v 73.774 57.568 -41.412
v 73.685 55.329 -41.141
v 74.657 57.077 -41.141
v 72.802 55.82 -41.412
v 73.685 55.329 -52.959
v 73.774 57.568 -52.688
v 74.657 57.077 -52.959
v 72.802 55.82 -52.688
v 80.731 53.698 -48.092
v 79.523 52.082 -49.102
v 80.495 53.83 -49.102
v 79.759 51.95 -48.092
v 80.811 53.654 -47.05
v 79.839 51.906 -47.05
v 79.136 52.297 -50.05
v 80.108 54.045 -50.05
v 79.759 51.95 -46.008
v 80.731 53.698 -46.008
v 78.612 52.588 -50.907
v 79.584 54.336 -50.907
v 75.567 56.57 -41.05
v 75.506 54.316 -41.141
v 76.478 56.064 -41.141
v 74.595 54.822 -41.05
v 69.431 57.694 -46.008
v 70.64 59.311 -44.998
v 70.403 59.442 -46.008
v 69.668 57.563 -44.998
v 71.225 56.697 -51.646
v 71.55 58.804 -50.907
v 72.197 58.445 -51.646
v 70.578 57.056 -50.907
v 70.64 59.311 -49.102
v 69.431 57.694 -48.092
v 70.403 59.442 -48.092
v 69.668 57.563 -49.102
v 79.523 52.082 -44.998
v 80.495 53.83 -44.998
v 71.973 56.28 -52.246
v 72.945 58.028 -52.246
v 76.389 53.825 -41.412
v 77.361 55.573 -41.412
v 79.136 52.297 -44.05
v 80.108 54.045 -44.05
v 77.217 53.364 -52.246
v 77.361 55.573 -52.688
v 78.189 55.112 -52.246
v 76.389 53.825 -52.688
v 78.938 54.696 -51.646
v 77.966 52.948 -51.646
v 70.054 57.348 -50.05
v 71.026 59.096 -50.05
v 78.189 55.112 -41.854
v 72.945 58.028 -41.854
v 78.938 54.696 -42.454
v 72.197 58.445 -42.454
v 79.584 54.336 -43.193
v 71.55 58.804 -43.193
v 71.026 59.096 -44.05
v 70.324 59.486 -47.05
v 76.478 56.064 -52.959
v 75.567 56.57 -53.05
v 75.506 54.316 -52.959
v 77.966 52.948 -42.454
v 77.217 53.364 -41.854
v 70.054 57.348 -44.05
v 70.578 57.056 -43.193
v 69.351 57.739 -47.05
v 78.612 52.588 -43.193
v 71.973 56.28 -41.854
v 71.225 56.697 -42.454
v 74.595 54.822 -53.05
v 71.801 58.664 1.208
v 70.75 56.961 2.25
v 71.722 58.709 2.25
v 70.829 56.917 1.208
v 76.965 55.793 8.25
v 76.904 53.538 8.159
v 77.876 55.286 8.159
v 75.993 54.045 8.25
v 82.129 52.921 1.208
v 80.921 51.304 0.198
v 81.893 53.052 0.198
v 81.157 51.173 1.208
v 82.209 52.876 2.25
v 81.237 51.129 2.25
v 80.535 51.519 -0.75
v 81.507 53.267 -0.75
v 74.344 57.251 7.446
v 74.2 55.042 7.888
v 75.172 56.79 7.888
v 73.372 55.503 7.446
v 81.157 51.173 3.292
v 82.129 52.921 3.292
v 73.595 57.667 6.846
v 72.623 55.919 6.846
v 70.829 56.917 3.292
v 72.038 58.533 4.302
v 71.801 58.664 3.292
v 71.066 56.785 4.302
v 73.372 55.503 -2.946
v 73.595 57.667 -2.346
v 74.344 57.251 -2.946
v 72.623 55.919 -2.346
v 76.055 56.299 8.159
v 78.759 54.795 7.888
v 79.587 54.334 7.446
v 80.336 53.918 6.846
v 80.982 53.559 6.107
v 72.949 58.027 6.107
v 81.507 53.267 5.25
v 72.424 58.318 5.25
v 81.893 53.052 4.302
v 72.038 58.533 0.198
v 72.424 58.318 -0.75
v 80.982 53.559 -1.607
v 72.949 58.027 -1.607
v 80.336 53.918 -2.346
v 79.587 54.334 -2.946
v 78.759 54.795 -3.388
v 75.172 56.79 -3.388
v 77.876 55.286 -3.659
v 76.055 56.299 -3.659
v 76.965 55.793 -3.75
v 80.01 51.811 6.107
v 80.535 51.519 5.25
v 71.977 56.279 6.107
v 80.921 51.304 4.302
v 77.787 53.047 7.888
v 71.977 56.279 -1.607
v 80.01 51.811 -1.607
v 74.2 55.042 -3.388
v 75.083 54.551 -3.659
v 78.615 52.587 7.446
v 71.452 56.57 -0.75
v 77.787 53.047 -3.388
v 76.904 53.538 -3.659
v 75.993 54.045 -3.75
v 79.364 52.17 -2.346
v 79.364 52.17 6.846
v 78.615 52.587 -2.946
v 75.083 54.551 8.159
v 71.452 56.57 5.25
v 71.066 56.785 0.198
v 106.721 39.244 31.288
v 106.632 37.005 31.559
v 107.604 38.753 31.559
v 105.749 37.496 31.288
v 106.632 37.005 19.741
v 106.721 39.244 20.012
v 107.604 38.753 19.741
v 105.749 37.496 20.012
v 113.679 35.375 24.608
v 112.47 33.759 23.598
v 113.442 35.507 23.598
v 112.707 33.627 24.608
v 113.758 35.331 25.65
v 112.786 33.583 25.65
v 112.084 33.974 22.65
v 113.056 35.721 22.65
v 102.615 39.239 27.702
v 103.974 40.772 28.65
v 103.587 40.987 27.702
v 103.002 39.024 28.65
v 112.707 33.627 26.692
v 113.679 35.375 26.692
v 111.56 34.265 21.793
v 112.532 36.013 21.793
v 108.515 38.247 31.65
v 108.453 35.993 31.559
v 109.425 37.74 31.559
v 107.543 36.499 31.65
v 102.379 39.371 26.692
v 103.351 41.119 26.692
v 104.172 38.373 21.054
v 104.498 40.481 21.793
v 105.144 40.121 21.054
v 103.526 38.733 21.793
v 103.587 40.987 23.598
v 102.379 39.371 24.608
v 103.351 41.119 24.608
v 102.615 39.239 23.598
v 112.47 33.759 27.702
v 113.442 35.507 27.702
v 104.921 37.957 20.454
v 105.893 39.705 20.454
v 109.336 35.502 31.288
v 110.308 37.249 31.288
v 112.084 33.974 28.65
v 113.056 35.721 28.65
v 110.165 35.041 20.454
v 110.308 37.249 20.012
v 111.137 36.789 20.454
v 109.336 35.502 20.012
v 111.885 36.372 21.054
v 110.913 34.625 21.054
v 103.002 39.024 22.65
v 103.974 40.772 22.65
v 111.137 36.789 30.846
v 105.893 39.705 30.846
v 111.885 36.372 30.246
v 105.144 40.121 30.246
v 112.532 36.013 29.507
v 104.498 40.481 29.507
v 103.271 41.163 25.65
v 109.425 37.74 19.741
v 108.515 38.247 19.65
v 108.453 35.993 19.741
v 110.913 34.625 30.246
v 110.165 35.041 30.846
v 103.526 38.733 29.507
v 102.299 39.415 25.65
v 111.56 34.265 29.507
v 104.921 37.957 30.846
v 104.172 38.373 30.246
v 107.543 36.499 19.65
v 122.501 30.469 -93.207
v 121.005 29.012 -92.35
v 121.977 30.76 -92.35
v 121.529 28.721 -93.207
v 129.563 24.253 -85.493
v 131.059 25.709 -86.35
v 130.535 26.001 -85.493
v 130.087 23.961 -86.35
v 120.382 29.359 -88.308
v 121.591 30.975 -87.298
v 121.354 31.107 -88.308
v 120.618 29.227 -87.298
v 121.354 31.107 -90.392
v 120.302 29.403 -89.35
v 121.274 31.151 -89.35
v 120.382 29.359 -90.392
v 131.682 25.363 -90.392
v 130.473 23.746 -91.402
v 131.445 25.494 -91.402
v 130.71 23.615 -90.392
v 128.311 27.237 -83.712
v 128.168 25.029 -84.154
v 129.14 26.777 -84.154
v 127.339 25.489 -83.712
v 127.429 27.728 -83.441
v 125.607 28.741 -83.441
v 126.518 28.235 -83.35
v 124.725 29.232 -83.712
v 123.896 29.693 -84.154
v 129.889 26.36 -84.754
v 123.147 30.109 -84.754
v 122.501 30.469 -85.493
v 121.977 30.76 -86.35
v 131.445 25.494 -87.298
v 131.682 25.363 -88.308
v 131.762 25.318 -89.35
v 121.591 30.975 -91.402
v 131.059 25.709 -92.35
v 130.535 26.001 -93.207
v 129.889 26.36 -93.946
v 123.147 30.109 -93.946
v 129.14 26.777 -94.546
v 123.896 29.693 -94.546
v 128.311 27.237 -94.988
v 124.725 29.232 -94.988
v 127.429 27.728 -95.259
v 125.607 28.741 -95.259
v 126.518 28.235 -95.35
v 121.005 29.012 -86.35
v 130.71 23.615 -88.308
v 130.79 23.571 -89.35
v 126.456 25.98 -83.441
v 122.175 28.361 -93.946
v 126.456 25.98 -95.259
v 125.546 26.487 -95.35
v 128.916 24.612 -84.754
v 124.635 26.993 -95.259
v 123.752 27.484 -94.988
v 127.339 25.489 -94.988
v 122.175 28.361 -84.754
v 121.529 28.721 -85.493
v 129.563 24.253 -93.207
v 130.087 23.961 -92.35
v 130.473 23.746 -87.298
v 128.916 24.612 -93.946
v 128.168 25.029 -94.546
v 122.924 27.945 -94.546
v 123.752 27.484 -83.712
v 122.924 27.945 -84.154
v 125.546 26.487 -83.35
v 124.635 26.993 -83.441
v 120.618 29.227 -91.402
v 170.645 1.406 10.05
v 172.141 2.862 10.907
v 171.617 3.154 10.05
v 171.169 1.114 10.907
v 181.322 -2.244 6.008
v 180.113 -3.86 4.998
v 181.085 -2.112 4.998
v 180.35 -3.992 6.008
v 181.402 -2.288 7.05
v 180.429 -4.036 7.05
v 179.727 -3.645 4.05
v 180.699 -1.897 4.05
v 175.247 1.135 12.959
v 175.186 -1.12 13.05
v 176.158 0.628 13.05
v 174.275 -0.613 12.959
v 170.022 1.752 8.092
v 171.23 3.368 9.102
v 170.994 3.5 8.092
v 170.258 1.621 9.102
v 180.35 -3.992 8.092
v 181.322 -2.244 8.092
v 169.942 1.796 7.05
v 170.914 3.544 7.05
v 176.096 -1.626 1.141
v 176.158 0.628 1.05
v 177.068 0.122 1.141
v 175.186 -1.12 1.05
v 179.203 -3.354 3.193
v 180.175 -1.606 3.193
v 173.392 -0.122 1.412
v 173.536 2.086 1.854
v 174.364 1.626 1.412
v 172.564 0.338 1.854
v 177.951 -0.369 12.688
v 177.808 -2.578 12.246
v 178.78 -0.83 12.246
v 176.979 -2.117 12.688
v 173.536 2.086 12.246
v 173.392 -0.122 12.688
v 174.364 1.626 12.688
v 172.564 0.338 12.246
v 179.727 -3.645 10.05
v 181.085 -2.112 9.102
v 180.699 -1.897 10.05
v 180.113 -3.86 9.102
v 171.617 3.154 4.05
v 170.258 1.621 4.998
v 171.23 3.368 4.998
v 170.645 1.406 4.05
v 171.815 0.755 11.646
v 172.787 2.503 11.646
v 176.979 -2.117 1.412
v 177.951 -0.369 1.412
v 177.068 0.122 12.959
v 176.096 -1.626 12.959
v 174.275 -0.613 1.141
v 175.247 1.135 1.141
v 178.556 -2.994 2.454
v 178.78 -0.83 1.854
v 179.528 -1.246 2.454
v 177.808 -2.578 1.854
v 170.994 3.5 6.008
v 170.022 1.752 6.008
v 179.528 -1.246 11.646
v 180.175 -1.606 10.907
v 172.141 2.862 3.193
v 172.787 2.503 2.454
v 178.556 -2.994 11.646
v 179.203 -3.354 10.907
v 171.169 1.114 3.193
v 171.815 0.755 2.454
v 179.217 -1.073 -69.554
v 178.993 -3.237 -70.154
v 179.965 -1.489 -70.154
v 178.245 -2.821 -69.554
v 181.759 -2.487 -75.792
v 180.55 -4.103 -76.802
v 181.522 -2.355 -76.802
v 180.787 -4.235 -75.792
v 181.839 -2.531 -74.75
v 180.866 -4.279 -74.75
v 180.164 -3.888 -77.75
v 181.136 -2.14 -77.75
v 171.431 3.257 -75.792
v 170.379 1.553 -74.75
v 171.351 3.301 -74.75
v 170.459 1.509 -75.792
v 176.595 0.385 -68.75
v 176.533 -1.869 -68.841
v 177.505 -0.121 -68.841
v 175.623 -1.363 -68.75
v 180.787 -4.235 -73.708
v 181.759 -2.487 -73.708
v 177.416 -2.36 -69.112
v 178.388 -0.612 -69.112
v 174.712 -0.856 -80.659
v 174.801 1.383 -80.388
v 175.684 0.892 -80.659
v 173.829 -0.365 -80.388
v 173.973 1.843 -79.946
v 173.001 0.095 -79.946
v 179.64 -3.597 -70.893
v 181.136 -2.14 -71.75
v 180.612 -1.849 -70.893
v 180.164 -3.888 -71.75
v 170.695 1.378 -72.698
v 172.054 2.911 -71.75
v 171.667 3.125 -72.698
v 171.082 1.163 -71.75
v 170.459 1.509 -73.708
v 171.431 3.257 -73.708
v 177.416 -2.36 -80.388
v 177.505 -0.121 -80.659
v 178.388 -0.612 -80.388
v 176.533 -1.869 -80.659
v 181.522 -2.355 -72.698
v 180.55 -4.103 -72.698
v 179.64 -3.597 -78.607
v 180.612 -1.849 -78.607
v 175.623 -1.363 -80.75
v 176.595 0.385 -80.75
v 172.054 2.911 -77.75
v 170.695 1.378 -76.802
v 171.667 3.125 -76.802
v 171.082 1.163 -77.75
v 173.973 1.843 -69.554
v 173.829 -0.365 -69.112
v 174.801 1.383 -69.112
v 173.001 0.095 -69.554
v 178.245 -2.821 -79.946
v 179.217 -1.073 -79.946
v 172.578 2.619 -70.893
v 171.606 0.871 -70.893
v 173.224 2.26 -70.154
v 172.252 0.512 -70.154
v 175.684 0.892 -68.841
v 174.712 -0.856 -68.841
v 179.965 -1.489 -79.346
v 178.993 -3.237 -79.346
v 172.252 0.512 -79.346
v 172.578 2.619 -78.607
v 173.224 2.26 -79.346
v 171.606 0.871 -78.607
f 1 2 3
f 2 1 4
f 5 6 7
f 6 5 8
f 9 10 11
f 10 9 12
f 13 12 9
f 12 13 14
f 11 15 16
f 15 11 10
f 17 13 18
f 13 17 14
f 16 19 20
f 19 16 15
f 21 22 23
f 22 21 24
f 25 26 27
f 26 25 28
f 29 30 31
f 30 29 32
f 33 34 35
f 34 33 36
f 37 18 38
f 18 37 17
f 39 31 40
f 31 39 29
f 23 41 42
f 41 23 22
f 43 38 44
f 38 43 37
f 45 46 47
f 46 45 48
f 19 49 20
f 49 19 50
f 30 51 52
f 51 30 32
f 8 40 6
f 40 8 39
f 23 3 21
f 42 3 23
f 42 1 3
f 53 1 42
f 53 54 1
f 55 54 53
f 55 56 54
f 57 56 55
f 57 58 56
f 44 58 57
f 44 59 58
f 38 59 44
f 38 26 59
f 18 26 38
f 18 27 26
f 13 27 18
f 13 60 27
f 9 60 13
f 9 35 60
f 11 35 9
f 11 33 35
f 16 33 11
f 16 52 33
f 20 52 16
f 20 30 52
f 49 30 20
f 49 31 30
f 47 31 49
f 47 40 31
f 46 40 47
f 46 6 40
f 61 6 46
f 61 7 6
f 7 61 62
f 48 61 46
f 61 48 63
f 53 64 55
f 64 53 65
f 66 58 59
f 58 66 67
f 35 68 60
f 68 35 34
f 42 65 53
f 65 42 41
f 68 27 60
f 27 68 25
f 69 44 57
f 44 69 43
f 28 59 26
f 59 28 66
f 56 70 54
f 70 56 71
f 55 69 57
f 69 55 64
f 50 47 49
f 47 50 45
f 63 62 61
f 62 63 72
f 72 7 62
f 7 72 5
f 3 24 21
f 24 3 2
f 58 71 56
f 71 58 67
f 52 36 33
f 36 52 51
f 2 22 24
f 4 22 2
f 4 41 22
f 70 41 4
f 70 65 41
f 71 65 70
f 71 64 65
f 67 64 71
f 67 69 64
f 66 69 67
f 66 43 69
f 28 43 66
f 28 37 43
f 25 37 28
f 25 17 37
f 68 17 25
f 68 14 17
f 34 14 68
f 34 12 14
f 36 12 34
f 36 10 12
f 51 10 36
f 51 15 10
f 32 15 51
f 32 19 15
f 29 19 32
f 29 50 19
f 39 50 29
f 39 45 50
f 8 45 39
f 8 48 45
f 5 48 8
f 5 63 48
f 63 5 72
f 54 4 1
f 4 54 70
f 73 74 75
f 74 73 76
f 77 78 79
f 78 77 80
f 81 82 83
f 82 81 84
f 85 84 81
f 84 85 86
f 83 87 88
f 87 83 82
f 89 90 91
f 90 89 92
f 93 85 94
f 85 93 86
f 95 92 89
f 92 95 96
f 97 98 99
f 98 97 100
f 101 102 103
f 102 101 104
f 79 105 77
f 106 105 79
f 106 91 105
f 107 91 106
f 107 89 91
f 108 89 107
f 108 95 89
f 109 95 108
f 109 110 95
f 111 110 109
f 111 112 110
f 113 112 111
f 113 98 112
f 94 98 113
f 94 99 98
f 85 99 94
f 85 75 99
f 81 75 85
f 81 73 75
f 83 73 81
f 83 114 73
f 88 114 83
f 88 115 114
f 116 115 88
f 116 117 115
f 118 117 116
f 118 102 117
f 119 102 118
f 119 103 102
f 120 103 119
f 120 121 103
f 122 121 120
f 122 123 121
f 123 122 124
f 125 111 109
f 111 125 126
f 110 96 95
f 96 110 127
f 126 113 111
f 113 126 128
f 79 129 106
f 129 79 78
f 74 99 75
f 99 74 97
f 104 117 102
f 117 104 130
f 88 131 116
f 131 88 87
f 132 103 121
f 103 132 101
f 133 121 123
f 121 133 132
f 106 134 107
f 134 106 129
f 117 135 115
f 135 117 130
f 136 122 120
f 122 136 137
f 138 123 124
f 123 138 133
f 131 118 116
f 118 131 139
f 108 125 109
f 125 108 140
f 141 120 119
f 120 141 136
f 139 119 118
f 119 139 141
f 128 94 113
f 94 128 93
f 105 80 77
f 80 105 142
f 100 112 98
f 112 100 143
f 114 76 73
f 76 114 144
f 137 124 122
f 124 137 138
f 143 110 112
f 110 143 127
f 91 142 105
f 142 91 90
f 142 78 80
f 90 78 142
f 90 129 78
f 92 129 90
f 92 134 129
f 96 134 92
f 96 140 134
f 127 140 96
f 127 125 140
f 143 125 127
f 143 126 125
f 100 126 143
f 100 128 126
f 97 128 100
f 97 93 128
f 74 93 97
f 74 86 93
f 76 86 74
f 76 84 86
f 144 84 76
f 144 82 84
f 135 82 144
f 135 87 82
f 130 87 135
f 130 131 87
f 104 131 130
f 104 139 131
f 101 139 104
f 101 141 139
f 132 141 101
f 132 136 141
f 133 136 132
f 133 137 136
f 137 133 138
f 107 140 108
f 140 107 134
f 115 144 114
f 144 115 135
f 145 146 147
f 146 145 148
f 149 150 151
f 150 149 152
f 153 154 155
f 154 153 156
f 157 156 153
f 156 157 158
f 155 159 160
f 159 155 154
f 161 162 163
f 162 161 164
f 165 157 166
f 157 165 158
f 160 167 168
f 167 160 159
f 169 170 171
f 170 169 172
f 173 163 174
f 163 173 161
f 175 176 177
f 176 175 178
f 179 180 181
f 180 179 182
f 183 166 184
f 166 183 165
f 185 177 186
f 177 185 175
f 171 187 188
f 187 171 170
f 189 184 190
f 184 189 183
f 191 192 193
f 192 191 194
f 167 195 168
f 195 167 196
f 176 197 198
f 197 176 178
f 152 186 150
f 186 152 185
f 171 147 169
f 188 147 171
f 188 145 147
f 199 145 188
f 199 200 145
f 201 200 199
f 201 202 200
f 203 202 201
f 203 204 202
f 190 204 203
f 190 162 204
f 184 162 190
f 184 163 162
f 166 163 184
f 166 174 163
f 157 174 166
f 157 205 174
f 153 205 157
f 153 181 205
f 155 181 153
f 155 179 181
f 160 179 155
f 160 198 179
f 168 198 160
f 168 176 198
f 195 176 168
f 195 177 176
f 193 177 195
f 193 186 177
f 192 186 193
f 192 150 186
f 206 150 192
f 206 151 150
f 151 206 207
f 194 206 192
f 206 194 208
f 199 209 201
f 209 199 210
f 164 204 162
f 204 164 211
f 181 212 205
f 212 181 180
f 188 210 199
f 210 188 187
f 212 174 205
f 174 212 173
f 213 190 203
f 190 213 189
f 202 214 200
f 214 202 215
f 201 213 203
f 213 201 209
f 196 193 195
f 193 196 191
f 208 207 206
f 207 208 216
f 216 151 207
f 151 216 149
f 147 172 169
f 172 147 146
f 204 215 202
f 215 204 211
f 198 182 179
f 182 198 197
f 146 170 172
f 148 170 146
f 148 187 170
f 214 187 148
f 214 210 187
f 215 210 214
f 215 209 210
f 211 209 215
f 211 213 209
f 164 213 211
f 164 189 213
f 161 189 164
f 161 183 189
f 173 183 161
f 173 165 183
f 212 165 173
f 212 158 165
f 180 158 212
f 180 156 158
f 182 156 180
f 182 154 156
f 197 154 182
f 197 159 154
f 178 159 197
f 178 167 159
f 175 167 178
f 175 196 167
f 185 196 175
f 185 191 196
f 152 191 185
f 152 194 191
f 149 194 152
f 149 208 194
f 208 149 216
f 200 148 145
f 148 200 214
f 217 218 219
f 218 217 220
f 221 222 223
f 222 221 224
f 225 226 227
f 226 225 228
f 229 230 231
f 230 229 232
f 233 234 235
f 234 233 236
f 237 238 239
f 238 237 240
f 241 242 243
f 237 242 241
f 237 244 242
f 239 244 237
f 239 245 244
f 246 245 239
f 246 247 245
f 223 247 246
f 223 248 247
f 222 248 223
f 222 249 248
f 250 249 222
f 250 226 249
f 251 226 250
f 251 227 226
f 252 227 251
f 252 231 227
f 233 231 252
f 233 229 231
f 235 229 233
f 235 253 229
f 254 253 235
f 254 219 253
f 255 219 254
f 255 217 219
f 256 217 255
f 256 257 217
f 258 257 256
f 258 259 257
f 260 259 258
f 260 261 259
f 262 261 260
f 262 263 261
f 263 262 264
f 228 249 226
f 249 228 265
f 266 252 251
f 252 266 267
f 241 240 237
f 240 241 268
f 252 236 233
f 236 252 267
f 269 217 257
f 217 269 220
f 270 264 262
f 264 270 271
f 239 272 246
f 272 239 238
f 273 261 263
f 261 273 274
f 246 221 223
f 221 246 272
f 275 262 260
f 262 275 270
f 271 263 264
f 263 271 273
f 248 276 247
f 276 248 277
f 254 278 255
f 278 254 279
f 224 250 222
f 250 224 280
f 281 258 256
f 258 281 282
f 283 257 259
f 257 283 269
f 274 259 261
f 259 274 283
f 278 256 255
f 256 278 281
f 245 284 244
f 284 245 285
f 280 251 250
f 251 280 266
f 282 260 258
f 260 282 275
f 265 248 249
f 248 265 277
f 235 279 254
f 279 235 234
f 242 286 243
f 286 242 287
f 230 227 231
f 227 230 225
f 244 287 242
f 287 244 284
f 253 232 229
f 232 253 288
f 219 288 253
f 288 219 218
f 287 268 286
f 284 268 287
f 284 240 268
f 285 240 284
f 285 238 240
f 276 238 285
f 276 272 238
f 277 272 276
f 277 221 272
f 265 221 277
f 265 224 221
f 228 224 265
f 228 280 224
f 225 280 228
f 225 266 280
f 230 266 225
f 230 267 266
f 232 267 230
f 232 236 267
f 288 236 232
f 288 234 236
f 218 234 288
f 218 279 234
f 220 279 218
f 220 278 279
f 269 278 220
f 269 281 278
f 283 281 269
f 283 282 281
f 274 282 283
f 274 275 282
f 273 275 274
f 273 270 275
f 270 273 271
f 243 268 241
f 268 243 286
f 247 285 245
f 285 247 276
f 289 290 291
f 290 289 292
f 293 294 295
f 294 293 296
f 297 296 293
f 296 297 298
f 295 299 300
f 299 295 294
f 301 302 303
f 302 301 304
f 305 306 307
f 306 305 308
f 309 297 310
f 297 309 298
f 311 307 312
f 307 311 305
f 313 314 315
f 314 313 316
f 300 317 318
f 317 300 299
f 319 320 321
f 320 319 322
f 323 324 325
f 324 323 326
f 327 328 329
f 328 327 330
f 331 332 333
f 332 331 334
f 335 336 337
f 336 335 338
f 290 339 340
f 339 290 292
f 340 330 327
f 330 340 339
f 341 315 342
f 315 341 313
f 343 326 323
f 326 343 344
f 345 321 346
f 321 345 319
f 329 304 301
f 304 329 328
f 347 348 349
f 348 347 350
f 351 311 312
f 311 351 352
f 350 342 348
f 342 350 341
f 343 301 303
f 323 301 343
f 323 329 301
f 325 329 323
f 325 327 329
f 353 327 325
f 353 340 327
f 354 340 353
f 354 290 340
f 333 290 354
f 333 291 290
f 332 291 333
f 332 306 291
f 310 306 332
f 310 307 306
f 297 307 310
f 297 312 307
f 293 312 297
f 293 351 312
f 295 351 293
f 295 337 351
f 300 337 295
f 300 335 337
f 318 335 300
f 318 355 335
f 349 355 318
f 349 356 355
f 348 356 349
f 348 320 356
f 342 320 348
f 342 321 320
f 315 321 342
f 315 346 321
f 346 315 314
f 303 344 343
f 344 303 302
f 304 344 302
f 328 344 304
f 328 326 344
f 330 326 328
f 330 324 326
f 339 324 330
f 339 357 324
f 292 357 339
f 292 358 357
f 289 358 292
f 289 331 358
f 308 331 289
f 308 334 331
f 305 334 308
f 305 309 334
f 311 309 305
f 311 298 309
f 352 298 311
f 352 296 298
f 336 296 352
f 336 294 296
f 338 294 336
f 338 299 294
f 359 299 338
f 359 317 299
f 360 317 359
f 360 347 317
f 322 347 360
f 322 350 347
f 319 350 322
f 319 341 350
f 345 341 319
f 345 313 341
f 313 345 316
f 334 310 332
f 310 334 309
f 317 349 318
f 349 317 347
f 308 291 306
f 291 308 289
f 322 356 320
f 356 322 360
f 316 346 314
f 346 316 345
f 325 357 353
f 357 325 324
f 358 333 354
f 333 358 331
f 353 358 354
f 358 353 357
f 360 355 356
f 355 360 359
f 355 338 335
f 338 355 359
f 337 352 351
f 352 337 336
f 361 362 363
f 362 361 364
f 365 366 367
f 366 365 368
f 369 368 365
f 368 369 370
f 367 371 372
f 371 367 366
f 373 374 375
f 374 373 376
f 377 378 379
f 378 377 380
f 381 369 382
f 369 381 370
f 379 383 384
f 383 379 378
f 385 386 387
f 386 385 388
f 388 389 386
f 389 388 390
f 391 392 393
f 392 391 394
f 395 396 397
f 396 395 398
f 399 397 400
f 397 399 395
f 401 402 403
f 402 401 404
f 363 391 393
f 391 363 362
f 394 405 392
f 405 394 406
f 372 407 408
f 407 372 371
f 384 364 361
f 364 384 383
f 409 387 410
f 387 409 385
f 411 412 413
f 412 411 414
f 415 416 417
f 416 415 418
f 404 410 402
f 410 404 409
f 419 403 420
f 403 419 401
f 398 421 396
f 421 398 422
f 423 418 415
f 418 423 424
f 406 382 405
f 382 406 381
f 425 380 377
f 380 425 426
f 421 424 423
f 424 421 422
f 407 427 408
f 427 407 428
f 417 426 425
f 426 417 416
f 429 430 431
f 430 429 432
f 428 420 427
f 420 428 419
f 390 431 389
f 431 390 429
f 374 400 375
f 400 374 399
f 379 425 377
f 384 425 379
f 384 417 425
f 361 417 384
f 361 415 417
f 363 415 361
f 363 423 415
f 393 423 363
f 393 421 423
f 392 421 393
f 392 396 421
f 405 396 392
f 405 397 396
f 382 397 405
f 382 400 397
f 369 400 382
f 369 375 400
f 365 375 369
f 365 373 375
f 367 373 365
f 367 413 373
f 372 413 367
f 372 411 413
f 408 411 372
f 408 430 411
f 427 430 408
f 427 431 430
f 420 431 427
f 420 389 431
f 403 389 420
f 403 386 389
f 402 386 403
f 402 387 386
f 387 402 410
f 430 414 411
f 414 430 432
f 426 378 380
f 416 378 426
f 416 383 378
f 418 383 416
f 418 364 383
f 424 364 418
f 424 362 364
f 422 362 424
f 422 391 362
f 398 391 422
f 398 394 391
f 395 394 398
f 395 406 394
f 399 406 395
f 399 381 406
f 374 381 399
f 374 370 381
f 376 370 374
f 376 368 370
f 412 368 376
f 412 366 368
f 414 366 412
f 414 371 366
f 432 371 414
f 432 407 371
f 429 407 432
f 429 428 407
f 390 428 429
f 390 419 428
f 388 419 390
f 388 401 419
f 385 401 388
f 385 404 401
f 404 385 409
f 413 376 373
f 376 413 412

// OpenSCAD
// file: _pts.scad
PTS=[[134.9-181,40.6],[136.5-181,-8.7],[172.6-181,-32.1],[193.2-181,82.9],[250.0-181,-13.5],[250.5-181,68.3]];
module discs(zc){ for(p=PTS) translate([p[0],p[1],zc]) cylinder(h=2,d=12,center=true,$fn=36); }
// main file
include <_pts.scad>
translate([117.8,37.66,-6.45]) rotate([0,0,-29.08]) rotate([-90,0,0]) discs(-5);
